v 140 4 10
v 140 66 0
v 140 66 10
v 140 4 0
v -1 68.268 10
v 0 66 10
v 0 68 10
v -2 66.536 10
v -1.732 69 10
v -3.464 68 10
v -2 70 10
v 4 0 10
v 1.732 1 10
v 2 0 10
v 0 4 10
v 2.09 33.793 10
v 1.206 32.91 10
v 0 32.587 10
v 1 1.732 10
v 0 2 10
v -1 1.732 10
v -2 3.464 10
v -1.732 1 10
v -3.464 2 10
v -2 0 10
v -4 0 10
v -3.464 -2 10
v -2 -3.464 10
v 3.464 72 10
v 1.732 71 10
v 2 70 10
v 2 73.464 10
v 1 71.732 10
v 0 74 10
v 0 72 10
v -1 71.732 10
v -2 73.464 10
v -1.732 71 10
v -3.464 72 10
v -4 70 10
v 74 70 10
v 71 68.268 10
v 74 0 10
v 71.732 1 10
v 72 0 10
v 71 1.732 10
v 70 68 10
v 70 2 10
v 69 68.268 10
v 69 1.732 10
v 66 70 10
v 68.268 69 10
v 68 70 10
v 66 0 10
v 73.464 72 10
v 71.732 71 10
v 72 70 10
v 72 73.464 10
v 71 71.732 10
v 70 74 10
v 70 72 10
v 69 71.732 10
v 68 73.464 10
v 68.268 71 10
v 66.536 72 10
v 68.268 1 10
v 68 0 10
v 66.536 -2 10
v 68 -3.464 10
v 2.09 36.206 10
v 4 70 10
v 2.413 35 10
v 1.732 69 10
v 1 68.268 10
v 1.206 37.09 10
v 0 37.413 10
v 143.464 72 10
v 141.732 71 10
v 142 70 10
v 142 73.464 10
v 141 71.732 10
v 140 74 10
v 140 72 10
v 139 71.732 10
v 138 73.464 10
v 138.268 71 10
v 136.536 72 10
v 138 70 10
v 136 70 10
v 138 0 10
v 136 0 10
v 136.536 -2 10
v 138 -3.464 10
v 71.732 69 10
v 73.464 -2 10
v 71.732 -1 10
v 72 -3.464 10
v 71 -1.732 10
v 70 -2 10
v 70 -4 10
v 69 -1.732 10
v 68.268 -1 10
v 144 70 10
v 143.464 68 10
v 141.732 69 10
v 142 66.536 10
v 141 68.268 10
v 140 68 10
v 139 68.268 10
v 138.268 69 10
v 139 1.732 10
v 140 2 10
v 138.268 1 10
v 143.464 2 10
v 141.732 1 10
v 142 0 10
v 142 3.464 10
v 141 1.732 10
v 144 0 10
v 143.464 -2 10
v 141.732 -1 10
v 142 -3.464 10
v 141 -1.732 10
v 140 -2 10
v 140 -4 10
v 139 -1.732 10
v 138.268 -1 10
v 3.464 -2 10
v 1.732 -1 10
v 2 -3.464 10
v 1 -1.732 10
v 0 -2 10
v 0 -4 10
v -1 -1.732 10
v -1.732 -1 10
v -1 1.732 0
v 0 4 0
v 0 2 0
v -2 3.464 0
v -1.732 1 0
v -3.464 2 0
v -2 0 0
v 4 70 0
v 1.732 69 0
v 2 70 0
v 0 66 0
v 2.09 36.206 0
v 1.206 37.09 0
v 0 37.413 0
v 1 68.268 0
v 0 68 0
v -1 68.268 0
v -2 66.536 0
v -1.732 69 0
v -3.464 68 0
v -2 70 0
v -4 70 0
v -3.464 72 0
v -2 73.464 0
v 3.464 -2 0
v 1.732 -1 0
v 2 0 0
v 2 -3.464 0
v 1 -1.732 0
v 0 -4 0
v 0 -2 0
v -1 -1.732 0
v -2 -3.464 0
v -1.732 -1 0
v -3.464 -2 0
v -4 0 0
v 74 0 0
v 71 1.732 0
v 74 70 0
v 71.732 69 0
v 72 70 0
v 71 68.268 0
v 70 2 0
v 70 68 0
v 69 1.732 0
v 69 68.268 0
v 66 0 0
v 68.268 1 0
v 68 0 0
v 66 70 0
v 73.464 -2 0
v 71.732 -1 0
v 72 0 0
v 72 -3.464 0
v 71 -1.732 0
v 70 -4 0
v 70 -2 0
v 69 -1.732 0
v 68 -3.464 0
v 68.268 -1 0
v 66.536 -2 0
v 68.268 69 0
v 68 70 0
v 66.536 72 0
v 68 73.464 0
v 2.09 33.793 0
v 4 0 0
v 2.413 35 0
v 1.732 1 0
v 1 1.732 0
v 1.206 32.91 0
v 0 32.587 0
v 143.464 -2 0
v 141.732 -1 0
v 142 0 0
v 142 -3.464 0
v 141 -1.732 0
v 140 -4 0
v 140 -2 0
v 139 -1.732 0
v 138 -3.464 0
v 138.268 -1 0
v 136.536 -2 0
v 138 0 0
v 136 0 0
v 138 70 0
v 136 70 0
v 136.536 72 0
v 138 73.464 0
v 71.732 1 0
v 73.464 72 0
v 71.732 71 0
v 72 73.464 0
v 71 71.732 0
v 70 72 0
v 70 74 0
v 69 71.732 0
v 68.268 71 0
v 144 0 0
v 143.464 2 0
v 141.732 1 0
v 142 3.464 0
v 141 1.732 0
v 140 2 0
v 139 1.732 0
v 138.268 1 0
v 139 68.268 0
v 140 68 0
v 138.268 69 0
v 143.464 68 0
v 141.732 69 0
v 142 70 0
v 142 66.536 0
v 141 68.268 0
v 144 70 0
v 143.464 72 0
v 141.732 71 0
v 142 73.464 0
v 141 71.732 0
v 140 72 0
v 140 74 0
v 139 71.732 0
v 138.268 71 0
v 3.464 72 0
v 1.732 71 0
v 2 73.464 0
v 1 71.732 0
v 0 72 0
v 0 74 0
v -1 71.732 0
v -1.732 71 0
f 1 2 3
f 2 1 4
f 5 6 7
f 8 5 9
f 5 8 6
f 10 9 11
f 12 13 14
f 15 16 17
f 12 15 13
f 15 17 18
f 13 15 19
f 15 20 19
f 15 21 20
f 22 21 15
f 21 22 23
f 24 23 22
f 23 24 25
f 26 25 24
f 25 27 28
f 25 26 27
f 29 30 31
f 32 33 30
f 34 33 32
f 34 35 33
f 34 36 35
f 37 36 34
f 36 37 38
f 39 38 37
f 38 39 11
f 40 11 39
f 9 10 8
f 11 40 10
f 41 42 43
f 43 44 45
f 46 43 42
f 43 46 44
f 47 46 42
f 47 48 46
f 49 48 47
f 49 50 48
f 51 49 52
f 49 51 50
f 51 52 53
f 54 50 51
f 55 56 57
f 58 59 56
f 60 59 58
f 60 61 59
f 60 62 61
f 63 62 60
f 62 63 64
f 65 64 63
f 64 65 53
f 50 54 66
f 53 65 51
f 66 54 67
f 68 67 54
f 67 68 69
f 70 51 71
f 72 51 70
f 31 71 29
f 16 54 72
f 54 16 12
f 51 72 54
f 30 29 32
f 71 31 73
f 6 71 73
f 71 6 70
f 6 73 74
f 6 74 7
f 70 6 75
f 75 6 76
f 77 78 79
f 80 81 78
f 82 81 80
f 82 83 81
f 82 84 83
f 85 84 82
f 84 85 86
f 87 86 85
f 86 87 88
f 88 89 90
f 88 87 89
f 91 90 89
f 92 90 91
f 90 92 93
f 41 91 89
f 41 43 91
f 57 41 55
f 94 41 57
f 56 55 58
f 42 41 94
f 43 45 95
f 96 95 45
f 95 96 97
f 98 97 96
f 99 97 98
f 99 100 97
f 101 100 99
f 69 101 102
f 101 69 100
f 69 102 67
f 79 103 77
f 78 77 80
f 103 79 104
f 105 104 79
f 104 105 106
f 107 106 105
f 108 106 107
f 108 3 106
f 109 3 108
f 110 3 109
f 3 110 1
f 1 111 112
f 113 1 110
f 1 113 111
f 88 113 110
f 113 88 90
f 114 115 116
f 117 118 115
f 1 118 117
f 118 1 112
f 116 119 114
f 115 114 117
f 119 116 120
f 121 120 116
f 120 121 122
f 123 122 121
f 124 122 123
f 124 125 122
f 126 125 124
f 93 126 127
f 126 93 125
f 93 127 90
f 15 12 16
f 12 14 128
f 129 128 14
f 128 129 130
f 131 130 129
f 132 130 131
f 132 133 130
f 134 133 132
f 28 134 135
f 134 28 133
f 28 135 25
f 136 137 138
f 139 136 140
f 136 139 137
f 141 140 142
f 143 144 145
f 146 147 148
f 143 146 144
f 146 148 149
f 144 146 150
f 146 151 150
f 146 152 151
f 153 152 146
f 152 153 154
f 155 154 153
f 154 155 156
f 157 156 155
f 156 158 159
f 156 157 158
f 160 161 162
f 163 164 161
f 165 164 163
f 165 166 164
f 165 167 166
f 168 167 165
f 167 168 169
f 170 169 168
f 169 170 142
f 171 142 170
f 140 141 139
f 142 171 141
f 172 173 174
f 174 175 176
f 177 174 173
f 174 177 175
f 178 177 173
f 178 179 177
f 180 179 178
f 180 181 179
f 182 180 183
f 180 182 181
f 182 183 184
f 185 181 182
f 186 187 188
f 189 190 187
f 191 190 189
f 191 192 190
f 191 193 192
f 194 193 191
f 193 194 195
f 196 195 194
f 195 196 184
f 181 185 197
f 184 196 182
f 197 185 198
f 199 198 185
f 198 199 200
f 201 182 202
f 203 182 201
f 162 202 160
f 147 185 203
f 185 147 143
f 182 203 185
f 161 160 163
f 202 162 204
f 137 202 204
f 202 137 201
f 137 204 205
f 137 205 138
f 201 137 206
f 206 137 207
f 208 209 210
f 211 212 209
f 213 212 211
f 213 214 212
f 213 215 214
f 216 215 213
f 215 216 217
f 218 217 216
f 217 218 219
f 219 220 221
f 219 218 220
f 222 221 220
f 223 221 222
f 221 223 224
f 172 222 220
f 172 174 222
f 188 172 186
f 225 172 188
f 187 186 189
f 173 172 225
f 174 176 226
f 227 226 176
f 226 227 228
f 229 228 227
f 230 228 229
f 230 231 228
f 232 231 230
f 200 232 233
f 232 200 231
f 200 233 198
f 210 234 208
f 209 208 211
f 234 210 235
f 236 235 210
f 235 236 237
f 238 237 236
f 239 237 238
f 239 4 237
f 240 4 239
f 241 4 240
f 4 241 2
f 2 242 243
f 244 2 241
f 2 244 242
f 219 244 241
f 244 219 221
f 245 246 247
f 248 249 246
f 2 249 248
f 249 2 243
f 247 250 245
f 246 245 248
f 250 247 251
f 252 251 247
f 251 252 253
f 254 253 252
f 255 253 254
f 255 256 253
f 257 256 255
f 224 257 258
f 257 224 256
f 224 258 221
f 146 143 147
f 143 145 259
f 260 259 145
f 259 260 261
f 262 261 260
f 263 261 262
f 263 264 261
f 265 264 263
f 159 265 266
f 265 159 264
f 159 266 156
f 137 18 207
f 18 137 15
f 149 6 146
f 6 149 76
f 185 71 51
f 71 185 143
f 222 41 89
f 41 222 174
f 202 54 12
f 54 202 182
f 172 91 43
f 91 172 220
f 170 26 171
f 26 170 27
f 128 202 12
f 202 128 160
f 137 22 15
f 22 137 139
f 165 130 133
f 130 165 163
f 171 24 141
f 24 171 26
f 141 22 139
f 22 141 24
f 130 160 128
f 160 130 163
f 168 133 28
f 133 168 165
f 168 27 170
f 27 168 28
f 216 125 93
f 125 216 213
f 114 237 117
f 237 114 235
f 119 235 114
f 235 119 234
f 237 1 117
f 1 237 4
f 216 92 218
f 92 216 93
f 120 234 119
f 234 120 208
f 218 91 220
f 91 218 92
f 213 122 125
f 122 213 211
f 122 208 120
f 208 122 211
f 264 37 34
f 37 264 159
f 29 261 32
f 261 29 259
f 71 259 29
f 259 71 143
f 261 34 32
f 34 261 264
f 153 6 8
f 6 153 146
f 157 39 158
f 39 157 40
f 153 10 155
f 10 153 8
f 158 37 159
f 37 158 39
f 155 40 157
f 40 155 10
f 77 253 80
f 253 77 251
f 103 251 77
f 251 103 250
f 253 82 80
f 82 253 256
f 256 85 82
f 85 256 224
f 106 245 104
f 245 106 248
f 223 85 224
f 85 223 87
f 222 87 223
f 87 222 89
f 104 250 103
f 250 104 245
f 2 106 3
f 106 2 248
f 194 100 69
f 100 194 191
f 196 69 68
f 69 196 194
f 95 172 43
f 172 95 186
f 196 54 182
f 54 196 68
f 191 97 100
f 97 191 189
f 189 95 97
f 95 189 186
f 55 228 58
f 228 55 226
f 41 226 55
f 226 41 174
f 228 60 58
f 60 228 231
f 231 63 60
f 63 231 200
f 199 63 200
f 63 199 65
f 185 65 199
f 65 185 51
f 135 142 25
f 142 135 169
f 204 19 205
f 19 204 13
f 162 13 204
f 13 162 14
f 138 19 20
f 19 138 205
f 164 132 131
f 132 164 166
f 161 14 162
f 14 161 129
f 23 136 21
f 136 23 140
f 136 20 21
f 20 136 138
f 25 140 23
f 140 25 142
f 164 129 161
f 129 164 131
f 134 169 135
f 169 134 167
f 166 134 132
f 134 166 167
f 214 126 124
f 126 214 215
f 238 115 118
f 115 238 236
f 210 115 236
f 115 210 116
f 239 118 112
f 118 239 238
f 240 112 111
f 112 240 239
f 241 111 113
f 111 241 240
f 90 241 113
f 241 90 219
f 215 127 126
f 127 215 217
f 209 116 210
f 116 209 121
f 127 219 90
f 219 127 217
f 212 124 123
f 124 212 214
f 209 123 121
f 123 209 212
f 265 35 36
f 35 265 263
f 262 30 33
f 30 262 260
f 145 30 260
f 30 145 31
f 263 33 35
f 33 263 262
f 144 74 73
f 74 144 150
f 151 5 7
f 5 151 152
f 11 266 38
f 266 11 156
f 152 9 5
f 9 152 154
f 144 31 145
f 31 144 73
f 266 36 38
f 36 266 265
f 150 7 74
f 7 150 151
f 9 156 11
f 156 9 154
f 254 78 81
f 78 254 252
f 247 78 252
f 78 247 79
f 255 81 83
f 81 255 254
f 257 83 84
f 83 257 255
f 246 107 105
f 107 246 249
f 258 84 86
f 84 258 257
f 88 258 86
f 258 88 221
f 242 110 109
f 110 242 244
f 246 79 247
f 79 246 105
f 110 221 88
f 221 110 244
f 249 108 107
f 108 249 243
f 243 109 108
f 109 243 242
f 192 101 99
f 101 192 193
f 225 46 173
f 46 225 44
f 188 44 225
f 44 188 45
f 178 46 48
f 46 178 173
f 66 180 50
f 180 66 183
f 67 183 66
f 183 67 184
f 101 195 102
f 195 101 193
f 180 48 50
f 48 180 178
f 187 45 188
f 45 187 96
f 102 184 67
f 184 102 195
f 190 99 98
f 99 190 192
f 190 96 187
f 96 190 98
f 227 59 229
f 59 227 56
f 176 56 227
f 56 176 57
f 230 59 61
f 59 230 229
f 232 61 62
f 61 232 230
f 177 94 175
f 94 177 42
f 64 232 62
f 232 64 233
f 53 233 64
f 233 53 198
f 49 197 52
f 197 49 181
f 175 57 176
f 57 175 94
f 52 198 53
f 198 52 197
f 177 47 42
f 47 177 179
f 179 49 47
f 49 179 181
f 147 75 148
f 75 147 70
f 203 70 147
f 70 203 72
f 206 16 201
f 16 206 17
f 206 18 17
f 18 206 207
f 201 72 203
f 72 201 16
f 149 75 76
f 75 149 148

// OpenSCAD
/* This is a jig for holding the rpi door controller PCB
   on a Sherline 5000 mill for isolation milling.  */

$fn = 12;

/* Set overall piece dimensions. */
x = 140;
y = 70;
z = 10;

/* Set the screw size in mm. */
screw_size = 4;

/* Set the mounting bolt dimensions. */

/* Use a #10 socket head cap screw. */
bolt_dia = (0.19 * 25.4); 
bolt_head_dia = (0.312 * 25.4);   
bolt_head_height = (0.19 * 25.4);

/* Set the distance between mounting holes. */
mount_hole_dist = (1.5 * 25.4); // 1.5 in
mount_hole_offset = (5 - (bolt_head_dia / 2));




difference() {

   union() {
      cube([x, y, z]);
   
      cylinder(h = z, r = screw_size);
      translate([x, 0, 0]) cylinder(h = z, r = screw_size);
      translate([0, y, 0]) cylinder(h = z, r = screw_size);
      translate([x, y, 0]) cylinder(h = z, r = screw_size);
      translate([x / 2, 0, 0]) cylinder(h = z, r = screw_size);
      translate([x / 2, y, 0]) cylinder(h = z, r = screw_size);
   } /* endunion */
   
   cylinder(h = z, r = screw_size / 2);
   translate([x, 0, 0]) cylinder(h = z, r = screw_size / 2);
   translate([0, y, 0]) cylinder(h = z, r = screw_size / 2);
   translate([x, y, 0]) cylinder(h = z, r = screw_size / 2);
   translate([x / 2, 0, 0]) cylinder(h = z, r = screw_size / 2);
   translate([x / 2, y, 0]) cylinder(h = z, r = screw_size / 2);

   /* Add some holes for the #10 socket head cap screws that
      attach the plate to the base. */
   translate([0, y / 2, 0])
      cylinder(h = z, r = bolt_dia / 2);
} /* enddifference */
